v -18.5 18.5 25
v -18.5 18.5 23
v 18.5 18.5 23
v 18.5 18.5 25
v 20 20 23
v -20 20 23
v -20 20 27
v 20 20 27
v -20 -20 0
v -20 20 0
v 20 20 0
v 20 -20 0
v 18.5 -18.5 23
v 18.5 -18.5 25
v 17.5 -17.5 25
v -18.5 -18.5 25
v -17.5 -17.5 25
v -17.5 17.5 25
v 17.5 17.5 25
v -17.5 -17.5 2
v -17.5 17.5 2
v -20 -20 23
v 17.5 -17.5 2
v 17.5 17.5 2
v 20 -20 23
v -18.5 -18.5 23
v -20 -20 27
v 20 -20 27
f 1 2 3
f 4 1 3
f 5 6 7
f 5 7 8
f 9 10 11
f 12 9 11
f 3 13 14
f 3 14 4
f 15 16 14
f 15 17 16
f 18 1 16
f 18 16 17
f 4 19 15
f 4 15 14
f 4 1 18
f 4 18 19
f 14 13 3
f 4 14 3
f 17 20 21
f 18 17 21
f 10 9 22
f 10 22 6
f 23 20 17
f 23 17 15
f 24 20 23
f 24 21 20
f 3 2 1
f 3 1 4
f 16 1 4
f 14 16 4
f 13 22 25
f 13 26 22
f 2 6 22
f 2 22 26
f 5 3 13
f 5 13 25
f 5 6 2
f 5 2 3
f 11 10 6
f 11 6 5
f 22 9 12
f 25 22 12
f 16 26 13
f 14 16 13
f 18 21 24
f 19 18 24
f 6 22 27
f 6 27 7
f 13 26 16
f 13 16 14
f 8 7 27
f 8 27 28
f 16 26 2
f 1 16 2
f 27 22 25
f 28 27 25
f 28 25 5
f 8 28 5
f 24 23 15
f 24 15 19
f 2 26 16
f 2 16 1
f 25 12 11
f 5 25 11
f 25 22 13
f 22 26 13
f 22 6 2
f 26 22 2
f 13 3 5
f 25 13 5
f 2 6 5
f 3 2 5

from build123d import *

# Parameters (mm, degrees)
F0_W     = 40
F0_H     = 40
F0_W_2   = 37
F0_H_2   = 37
F0_W_3   = 35
F0_H_3   = 35
F0_W_4   = 34
F0_H_4   = 34
F1_DEPTH = 2
F2_DEPTH = 25
F3_DEPTH = 23
F4_START = 23
F4_DEPTH = 4
F5_START = 25
F5_DEPTH = 2


with BuildPart() as f1:
    # F0 (on Top) → F1 (new body)
    with BuildSketch(Plane.XY):
        Rectangle(F0_W, F0_H)
        Rectangle(F0_W_2, F0_H_2, mode=Mode.SUBTRACT)
        Rectangle(F0_W_2, F0_H_2)
        Rectangle(F0_W_3, F0_H_3, mode=Mode.SUBTRACT)
        Rectangle(F0_W_3, F0_H_3)
        Rectangle(F0_W_4, F0_H_4, mode=Mode.SUBTRACT)
        Rectangle(F0_W_4, F0_H_4)
    extrude(amount=F1_DEPTH)

    # F0 (on Top) → F2 (join)
    with BuildSketch(Plane.XY):
        Rectangle(F0_W_2, F0_H_2)
        Rectangle(F0_W_3, F0_H_3, mode=Mode.SUBTRACT)
    extrude(amount=F2_DEPTH)

    # F0 (on Top) → F3 (join)
    with BuildSketch(Plane.XY):
        Rectangle(F0_W, F0_H)
        Rectangle(F0_W_2, F0_H_2, mode=Mode.SUBTRACT)
    extrude(amount=F3_DEPTH)


with BuildPart() as f4:
    # F0 (on Top) → F4 (new body)
    with BuildSketch(Plane.XY.offset(F4_START)):
        Rectangle(F0_W, F0_H)
        Rectangle(F0_W_2, F0_H_2, mode=Mode.SUBTRACT)
    extrude(amount=F4_DEPTH)

    # F0 (on Top) → F5 (join)
    with BuildSketch(Plane.XY.offset(F5_START)):
        Rectangle(F0_W_2, F0_H_2)
        Rectangle(F0_W_3, F0_H_3, mode=Mode.SUBTRACT)
        Rectangle(F0_W_3, F0_H_3)
        Rectangle(F0_W_4, F0_H_4, mode=Mode.SUBTRACT)
        Rectangle(F0_W_4, F0_H_4)
    extrude(amount=F5_DEPTH)


solid = Compound([f1.part, f4.part])
